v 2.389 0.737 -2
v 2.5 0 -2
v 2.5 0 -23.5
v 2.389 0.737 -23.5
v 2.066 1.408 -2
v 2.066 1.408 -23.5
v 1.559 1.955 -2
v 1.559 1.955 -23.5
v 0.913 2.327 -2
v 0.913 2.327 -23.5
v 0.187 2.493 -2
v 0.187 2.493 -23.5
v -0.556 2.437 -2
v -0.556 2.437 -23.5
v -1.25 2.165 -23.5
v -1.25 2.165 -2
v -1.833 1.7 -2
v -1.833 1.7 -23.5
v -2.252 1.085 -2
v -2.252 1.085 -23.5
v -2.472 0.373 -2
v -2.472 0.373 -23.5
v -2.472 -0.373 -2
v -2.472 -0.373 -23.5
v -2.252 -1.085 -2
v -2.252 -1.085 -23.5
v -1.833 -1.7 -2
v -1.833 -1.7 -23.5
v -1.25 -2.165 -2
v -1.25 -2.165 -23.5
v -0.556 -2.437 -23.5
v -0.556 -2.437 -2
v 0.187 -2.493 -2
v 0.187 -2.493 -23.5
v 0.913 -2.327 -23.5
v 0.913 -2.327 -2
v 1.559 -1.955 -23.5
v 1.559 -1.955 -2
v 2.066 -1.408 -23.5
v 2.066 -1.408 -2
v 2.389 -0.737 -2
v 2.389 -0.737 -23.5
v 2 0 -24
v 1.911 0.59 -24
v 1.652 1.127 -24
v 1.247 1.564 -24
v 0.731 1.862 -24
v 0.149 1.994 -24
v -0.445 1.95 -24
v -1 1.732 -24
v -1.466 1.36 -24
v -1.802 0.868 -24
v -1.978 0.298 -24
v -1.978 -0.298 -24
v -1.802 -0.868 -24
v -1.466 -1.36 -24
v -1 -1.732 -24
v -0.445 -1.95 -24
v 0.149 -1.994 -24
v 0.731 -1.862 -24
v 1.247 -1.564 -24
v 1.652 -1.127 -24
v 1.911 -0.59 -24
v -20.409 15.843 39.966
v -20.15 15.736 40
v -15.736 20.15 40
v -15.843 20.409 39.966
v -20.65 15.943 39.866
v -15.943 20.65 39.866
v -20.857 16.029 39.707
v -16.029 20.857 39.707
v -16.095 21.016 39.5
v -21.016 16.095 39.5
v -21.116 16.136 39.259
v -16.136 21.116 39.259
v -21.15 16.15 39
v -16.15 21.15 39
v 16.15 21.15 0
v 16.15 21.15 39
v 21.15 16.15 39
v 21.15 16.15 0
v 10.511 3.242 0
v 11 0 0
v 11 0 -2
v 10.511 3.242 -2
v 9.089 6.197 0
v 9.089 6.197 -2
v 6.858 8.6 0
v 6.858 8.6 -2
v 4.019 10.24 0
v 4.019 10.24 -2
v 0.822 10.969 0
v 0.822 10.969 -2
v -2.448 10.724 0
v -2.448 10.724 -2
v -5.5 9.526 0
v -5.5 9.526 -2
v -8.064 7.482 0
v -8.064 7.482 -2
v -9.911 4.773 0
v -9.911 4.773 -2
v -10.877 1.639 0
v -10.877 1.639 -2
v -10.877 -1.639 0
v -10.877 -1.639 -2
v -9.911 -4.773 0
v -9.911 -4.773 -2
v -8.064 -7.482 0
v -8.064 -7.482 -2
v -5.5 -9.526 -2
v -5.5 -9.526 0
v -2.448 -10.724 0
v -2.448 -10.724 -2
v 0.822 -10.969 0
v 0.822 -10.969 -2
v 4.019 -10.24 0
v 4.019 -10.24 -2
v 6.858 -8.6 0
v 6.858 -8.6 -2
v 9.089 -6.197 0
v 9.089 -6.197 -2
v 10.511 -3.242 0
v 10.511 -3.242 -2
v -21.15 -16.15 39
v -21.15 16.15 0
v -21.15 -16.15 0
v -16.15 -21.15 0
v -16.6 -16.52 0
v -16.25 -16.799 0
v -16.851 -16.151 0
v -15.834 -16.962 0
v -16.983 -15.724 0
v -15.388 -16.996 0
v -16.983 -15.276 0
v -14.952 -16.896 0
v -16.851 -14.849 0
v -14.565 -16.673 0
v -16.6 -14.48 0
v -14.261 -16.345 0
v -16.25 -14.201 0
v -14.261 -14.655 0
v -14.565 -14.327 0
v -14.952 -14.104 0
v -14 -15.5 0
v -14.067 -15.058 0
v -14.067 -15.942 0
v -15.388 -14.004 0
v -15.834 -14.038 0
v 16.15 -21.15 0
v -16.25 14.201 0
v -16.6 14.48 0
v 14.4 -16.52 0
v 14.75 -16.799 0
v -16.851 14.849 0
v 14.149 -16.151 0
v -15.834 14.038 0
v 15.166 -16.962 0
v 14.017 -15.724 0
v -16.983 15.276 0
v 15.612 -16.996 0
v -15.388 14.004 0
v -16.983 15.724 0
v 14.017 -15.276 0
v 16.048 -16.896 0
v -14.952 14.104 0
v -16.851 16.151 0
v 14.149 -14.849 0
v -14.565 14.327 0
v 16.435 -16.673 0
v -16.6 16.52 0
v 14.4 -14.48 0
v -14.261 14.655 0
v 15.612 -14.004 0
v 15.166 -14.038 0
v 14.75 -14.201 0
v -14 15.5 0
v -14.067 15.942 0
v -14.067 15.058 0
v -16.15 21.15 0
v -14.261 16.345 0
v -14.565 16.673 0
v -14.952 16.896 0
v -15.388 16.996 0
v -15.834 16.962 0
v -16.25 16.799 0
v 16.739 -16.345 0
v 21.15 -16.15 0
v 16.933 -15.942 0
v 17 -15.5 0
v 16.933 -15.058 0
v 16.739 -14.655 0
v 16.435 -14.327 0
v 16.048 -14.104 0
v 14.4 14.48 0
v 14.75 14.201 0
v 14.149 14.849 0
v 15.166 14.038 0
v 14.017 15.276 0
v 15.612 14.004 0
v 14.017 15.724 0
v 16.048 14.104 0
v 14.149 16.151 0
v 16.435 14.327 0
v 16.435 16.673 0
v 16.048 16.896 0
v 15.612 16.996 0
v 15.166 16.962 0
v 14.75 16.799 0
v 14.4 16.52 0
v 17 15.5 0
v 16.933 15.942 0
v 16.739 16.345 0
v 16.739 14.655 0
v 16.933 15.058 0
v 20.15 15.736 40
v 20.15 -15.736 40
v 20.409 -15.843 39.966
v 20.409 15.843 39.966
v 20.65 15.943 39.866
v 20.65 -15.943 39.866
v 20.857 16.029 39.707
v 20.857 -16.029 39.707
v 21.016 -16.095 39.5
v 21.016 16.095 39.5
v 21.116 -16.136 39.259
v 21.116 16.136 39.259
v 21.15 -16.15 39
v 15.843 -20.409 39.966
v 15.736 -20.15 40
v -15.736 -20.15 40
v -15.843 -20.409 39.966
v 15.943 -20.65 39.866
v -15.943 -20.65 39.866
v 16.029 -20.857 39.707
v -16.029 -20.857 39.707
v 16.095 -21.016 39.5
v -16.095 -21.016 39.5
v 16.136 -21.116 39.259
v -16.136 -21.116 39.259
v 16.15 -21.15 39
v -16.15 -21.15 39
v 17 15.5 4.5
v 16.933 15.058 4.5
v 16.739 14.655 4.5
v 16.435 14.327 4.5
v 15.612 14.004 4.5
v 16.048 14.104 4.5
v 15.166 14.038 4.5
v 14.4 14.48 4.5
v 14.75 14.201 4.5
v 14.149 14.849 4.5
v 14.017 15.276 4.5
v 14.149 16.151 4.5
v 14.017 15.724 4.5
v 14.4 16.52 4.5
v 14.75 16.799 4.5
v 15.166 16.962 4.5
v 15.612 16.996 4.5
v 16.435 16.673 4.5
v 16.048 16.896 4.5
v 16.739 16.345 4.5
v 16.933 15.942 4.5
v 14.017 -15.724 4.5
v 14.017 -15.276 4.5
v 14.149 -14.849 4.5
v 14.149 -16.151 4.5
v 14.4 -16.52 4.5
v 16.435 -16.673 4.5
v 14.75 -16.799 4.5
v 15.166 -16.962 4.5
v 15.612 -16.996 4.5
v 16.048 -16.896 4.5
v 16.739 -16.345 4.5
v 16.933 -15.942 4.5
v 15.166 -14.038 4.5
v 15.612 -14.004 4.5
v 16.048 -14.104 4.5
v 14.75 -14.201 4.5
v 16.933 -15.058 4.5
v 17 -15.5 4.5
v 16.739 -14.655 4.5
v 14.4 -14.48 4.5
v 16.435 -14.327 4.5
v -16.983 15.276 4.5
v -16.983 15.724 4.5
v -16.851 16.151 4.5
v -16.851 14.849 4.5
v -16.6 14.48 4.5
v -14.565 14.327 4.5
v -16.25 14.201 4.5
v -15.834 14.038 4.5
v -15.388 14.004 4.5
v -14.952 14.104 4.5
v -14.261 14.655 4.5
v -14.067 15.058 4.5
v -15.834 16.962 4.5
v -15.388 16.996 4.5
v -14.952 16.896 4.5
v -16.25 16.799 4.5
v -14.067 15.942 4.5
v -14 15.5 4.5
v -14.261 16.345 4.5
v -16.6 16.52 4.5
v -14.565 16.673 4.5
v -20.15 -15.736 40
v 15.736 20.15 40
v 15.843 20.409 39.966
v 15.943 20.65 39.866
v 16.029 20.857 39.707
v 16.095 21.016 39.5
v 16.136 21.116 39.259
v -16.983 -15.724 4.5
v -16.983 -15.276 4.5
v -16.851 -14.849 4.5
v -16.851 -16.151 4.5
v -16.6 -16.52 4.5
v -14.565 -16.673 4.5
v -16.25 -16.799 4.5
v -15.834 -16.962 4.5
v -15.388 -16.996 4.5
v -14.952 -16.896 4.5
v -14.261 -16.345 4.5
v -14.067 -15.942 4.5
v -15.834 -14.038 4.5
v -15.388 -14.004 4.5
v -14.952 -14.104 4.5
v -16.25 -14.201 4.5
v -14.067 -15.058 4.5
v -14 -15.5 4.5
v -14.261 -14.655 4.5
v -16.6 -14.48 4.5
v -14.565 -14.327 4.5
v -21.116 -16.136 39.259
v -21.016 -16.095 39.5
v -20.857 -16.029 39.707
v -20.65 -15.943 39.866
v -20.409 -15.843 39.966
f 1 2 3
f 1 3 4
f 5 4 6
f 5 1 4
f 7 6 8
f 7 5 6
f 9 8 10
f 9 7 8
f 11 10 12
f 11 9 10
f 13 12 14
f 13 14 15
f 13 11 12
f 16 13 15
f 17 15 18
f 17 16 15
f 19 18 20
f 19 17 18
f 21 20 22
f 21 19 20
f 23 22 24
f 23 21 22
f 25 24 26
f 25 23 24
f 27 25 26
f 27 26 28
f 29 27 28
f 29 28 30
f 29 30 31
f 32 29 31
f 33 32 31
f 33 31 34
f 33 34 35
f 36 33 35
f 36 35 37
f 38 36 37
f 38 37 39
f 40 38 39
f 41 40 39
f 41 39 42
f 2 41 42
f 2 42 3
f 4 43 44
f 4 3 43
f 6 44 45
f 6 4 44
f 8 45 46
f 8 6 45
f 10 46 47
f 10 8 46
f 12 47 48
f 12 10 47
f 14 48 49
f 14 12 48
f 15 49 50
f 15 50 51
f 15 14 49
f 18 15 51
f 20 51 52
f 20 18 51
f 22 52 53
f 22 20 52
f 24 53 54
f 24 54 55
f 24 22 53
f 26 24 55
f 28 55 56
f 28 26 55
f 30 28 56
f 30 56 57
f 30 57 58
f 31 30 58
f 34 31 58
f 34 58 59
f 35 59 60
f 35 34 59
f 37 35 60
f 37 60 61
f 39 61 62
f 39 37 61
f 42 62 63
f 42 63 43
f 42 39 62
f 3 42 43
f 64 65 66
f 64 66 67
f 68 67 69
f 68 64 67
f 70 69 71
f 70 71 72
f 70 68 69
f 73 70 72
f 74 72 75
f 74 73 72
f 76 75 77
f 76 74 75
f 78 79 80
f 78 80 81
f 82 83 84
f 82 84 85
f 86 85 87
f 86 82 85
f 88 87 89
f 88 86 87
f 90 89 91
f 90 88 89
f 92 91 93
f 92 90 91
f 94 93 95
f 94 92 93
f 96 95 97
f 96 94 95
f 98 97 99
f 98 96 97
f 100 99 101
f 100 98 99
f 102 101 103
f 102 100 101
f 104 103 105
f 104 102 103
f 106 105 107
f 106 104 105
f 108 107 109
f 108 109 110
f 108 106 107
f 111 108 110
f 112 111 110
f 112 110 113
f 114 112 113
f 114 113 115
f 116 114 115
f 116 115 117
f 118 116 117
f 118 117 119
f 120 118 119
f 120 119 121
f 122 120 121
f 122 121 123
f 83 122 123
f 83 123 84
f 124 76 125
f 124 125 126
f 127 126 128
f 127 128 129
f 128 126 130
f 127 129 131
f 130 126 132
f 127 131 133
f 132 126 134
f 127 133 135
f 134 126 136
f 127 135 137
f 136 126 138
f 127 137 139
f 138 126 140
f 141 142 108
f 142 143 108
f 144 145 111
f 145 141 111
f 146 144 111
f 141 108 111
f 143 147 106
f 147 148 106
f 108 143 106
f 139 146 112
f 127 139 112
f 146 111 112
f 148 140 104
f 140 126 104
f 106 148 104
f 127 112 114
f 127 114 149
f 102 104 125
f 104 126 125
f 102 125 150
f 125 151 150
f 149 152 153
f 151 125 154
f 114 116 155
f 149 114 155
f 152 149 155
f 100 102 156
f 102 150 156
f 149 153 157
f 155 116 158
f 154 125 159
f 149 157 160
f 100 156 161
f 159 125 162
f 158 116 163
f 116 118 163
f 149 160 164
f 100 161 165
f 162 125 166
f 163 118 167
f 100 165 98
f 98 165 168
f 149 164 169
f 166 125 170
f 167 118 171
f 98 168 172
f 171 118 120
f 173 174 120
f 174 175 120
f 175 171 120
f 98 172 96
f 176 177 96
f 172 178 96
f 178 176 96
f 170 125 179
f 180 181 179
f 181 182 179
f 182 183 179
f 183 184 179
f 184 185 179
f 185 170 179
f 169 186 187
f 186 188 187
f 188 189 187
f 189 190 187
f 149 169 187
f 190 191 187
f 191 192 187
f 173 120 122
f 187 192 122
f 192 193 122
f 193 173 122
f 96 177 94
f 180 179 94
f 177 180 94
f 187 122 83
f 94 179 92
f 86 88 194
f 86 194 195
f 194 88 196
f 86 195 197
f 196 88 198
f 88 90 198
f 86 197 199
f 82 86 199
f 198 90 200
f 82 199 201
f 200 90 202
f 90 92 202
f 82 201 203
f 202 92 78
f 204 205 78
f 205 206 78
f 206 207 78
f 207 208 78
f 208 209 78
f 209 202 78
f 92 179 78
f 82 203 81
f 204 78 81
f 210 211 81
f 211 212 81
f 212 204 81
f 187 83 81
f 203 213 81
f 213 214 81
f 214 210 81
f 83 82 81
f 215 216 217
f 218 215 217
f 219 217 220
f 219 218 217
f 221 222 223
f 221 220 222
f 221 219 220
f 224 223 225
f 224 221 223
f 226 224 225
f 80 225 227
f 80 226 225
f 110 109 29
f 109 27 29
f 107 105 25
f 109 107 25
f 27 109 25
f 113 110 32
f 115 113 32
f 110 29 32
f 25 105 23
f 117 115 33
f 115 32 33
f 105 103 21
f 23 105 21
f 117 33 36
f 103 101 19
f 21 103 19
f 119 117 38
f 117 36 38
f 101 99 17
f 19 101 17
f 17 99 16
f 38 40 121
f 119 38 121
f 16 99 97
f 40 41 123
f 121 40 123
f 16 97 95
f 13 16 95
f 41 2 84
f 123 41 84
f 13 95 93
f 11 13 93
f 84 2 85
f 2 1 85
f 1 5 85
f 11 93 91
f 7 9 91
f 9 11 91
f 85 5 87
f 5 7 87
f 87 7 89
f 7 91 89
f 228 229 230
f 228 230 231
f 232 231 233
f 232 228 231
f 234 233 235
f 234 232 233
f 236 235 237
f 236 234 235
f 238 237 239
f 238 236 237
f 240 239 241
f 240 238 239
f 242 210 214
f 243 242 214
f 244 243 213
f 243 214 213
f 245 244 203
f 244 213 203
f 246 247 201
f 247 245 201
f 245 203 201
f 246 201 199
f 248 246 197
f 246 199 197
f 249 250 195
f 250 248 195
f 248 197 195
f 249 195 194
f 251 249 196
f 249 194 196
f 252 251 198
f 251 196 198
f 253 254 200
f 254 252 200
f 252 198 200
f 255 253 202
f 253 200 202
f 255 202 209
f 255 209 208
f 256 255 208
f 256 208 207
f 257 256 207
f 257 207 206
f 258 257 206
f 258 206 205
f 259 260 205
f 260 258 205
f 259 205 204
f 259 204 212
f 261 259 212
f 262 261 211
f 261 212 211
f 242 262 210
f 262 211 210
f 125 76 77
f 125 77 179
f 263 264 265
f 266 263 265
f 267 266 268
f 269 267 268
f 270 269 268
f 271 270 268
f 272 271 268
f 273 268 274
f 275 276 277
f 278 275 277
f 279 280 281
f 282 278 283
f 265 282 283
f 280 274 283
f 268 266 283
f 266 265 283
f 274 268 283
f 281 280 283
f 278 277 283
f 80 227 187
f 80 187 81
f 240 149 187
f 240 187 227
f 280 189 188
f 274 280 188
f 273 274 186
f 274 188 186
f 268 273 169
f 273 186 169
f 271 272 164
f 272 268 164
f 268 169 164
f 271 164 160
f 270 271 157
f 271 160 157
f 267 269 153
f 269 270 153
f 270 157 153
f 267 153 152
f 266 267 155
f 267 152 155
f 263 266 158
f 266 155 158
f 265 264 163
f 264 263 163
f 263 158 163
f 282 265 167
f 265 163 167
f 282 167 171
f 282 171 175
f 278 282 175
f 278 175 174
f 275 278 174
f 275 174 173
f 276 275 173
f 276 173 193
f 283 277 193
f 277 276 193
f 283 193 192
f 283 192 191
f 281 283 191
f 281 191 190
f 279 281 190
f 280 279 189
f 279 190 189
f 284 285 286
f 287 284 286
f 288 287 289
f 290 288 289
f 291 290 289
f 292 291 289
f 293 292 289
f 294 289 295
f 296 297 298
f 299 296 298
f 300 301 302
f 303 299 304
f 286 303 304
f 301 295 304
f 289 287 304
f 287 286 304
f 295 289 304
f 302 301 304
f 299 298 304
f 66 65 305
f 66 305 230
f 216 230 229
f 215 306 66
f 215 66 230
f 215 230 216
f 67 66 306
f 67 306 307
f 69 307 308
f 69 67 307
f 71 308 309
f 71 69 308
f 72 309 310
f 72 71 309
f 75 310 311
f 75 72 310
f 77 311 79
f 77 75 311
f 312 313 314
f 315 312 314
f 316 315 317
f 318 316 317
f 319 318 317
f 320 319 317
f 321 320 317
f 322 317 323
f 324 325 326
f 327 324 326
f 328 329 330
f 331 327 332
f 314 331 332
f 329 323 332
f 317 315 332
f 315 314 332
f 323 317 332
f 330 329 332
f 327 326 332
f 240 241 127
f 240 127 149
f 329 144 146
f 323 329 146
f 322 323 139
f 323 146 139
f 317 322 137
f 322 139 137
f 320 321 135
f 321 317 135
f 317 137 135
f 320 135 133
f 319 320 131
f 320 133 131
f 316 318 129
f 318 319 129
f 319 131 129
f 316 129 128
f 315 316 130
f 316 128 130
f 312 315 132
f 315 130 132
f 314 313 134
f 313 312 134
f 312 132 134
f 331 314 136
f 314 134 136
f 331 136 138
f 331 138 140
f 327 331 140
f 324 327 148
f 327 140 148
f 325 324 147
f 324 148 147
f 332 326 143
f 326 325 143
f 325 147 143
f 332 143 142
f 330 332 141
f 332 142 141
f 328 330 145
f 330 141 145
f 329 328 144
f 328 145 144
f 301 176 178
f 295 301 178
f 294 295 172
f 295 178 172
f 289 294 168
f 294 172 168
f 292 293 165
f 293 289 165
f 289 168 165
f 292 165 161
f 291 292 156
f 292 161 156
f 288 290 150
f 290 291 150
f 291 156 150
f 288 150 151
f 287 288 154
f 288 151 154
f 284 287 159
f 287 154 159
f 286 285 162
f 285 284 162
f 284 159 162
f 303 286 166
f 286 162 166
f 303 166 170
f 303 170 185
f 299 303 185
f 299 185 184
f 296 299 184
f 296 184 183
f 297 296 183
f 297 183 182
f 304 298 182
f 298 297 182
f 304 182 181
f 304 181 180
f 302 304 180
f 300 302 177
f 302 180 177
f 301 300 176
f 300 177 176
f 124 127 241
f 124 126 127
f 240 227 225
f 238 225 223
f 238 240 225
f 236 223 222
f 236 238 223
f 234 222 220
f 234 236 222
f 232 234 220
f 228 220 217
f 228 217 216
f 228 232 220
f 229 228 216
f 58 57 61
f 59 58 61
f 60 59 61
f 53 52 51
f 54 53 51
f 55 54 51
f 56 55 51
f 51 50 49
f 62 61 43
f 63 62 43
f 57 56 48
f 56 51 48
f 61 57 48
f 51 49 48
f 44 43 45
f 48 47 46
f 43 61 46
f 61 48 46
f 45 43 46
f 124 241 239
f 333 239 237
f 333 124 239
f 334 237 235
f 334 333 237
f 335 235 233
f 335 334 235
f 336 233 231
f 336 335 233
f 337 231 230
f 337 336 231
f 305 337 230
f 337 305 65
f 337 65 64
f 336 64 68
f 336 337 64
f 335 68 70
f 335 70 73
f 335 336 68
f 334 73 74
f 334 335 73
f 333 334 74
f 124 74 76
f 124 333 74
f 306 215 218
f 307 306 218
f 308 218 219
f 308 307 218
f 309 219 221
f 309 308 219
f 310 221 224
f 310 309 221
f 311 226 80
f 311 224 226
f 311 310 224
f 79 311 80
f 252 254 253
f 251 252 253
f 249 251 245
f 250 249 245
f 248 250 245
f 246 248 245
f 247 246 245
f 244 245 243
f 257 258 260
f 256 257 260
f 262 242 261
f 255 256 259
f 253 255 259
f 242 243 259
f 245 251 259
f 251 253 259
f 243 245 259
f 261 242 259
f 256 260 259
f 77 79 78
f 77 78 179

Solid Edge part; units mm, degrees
sketch "Sketch1" plane through (0, 0, 0) normal (0, 0, 1) x (1, 0, 0)
  line L0 (21.15, -21.15) -> (21.15, 21.15)
  line L1 (21.15, 21.15) -> (-21.15, 21.15)
  line L2 (-21.15, 21.15) -> (-21.15, -21.15)
  line L3 (-21.15, -21.15) -> (21.15, -21.15)
extrude "Protrusion1" add sketch "Sketch1" along normal blind 40
sketch "Sketch2" plane through (0, 0, 0) normal (0, 0, 1) x (1, 0, 0)
  circle A0 centre (0, 0) radius 11
extrude "ExtrudedProtrusion_2" add sketch "Sketch2" against normal blind 2
sketch "Sketch3" plane through (0, 0, 0) normal (0, 0, 1) x (1, 0, 0)
  circle A0 centre (0, 0) radius 2.5
extrude "ExtrudedProtrusion_3" add sketch "Sketch3" against normal blind 24
sketch "Sketch4" plane through (0, 0, 0) normal (0, 0, 1) x (1, 0, 0)
  circle A0 centre (15.5, 15.5) radius 1.5
  circle A1 centre (-15.5, 15.5) radius 1.5
  circle A2 centre (-15.5, -15.5) radius 1.5
  circle A3 centre (15.5, -15.5) radius 1.5
  dimension "D1" = 42.3
  dimension "D2" = 22
  dimension "D3" = 5
  dimension "D4" = 31
  dimension "D5" = 3
extrude "ExtrudedCutout_1" cut sketch "Sketch4" along normal blind 4.5
chamfer "Chamfer_1" distance 5 angle 45 4 edges at (21.15, 21.15, 20) (-21.15, 21.15, 20) (-21.15, -21.15, 20) (21.15, -21.15, 20)
fillet "Round_1" radius 1 8 edges at (0, 21.15, 40) (-18.65, 18.65, 40) (-21.15, 0, 40) (-18.65, -18.65, 40) (0, -21.15, 40) (18.65, -18.65, 40) (21.15, 0, 40) (18.65, 18.65, 40)
chamfer "Chamfer_2" distance 0.5 angle 45 1 edges at (-2.5, 0, -24)
